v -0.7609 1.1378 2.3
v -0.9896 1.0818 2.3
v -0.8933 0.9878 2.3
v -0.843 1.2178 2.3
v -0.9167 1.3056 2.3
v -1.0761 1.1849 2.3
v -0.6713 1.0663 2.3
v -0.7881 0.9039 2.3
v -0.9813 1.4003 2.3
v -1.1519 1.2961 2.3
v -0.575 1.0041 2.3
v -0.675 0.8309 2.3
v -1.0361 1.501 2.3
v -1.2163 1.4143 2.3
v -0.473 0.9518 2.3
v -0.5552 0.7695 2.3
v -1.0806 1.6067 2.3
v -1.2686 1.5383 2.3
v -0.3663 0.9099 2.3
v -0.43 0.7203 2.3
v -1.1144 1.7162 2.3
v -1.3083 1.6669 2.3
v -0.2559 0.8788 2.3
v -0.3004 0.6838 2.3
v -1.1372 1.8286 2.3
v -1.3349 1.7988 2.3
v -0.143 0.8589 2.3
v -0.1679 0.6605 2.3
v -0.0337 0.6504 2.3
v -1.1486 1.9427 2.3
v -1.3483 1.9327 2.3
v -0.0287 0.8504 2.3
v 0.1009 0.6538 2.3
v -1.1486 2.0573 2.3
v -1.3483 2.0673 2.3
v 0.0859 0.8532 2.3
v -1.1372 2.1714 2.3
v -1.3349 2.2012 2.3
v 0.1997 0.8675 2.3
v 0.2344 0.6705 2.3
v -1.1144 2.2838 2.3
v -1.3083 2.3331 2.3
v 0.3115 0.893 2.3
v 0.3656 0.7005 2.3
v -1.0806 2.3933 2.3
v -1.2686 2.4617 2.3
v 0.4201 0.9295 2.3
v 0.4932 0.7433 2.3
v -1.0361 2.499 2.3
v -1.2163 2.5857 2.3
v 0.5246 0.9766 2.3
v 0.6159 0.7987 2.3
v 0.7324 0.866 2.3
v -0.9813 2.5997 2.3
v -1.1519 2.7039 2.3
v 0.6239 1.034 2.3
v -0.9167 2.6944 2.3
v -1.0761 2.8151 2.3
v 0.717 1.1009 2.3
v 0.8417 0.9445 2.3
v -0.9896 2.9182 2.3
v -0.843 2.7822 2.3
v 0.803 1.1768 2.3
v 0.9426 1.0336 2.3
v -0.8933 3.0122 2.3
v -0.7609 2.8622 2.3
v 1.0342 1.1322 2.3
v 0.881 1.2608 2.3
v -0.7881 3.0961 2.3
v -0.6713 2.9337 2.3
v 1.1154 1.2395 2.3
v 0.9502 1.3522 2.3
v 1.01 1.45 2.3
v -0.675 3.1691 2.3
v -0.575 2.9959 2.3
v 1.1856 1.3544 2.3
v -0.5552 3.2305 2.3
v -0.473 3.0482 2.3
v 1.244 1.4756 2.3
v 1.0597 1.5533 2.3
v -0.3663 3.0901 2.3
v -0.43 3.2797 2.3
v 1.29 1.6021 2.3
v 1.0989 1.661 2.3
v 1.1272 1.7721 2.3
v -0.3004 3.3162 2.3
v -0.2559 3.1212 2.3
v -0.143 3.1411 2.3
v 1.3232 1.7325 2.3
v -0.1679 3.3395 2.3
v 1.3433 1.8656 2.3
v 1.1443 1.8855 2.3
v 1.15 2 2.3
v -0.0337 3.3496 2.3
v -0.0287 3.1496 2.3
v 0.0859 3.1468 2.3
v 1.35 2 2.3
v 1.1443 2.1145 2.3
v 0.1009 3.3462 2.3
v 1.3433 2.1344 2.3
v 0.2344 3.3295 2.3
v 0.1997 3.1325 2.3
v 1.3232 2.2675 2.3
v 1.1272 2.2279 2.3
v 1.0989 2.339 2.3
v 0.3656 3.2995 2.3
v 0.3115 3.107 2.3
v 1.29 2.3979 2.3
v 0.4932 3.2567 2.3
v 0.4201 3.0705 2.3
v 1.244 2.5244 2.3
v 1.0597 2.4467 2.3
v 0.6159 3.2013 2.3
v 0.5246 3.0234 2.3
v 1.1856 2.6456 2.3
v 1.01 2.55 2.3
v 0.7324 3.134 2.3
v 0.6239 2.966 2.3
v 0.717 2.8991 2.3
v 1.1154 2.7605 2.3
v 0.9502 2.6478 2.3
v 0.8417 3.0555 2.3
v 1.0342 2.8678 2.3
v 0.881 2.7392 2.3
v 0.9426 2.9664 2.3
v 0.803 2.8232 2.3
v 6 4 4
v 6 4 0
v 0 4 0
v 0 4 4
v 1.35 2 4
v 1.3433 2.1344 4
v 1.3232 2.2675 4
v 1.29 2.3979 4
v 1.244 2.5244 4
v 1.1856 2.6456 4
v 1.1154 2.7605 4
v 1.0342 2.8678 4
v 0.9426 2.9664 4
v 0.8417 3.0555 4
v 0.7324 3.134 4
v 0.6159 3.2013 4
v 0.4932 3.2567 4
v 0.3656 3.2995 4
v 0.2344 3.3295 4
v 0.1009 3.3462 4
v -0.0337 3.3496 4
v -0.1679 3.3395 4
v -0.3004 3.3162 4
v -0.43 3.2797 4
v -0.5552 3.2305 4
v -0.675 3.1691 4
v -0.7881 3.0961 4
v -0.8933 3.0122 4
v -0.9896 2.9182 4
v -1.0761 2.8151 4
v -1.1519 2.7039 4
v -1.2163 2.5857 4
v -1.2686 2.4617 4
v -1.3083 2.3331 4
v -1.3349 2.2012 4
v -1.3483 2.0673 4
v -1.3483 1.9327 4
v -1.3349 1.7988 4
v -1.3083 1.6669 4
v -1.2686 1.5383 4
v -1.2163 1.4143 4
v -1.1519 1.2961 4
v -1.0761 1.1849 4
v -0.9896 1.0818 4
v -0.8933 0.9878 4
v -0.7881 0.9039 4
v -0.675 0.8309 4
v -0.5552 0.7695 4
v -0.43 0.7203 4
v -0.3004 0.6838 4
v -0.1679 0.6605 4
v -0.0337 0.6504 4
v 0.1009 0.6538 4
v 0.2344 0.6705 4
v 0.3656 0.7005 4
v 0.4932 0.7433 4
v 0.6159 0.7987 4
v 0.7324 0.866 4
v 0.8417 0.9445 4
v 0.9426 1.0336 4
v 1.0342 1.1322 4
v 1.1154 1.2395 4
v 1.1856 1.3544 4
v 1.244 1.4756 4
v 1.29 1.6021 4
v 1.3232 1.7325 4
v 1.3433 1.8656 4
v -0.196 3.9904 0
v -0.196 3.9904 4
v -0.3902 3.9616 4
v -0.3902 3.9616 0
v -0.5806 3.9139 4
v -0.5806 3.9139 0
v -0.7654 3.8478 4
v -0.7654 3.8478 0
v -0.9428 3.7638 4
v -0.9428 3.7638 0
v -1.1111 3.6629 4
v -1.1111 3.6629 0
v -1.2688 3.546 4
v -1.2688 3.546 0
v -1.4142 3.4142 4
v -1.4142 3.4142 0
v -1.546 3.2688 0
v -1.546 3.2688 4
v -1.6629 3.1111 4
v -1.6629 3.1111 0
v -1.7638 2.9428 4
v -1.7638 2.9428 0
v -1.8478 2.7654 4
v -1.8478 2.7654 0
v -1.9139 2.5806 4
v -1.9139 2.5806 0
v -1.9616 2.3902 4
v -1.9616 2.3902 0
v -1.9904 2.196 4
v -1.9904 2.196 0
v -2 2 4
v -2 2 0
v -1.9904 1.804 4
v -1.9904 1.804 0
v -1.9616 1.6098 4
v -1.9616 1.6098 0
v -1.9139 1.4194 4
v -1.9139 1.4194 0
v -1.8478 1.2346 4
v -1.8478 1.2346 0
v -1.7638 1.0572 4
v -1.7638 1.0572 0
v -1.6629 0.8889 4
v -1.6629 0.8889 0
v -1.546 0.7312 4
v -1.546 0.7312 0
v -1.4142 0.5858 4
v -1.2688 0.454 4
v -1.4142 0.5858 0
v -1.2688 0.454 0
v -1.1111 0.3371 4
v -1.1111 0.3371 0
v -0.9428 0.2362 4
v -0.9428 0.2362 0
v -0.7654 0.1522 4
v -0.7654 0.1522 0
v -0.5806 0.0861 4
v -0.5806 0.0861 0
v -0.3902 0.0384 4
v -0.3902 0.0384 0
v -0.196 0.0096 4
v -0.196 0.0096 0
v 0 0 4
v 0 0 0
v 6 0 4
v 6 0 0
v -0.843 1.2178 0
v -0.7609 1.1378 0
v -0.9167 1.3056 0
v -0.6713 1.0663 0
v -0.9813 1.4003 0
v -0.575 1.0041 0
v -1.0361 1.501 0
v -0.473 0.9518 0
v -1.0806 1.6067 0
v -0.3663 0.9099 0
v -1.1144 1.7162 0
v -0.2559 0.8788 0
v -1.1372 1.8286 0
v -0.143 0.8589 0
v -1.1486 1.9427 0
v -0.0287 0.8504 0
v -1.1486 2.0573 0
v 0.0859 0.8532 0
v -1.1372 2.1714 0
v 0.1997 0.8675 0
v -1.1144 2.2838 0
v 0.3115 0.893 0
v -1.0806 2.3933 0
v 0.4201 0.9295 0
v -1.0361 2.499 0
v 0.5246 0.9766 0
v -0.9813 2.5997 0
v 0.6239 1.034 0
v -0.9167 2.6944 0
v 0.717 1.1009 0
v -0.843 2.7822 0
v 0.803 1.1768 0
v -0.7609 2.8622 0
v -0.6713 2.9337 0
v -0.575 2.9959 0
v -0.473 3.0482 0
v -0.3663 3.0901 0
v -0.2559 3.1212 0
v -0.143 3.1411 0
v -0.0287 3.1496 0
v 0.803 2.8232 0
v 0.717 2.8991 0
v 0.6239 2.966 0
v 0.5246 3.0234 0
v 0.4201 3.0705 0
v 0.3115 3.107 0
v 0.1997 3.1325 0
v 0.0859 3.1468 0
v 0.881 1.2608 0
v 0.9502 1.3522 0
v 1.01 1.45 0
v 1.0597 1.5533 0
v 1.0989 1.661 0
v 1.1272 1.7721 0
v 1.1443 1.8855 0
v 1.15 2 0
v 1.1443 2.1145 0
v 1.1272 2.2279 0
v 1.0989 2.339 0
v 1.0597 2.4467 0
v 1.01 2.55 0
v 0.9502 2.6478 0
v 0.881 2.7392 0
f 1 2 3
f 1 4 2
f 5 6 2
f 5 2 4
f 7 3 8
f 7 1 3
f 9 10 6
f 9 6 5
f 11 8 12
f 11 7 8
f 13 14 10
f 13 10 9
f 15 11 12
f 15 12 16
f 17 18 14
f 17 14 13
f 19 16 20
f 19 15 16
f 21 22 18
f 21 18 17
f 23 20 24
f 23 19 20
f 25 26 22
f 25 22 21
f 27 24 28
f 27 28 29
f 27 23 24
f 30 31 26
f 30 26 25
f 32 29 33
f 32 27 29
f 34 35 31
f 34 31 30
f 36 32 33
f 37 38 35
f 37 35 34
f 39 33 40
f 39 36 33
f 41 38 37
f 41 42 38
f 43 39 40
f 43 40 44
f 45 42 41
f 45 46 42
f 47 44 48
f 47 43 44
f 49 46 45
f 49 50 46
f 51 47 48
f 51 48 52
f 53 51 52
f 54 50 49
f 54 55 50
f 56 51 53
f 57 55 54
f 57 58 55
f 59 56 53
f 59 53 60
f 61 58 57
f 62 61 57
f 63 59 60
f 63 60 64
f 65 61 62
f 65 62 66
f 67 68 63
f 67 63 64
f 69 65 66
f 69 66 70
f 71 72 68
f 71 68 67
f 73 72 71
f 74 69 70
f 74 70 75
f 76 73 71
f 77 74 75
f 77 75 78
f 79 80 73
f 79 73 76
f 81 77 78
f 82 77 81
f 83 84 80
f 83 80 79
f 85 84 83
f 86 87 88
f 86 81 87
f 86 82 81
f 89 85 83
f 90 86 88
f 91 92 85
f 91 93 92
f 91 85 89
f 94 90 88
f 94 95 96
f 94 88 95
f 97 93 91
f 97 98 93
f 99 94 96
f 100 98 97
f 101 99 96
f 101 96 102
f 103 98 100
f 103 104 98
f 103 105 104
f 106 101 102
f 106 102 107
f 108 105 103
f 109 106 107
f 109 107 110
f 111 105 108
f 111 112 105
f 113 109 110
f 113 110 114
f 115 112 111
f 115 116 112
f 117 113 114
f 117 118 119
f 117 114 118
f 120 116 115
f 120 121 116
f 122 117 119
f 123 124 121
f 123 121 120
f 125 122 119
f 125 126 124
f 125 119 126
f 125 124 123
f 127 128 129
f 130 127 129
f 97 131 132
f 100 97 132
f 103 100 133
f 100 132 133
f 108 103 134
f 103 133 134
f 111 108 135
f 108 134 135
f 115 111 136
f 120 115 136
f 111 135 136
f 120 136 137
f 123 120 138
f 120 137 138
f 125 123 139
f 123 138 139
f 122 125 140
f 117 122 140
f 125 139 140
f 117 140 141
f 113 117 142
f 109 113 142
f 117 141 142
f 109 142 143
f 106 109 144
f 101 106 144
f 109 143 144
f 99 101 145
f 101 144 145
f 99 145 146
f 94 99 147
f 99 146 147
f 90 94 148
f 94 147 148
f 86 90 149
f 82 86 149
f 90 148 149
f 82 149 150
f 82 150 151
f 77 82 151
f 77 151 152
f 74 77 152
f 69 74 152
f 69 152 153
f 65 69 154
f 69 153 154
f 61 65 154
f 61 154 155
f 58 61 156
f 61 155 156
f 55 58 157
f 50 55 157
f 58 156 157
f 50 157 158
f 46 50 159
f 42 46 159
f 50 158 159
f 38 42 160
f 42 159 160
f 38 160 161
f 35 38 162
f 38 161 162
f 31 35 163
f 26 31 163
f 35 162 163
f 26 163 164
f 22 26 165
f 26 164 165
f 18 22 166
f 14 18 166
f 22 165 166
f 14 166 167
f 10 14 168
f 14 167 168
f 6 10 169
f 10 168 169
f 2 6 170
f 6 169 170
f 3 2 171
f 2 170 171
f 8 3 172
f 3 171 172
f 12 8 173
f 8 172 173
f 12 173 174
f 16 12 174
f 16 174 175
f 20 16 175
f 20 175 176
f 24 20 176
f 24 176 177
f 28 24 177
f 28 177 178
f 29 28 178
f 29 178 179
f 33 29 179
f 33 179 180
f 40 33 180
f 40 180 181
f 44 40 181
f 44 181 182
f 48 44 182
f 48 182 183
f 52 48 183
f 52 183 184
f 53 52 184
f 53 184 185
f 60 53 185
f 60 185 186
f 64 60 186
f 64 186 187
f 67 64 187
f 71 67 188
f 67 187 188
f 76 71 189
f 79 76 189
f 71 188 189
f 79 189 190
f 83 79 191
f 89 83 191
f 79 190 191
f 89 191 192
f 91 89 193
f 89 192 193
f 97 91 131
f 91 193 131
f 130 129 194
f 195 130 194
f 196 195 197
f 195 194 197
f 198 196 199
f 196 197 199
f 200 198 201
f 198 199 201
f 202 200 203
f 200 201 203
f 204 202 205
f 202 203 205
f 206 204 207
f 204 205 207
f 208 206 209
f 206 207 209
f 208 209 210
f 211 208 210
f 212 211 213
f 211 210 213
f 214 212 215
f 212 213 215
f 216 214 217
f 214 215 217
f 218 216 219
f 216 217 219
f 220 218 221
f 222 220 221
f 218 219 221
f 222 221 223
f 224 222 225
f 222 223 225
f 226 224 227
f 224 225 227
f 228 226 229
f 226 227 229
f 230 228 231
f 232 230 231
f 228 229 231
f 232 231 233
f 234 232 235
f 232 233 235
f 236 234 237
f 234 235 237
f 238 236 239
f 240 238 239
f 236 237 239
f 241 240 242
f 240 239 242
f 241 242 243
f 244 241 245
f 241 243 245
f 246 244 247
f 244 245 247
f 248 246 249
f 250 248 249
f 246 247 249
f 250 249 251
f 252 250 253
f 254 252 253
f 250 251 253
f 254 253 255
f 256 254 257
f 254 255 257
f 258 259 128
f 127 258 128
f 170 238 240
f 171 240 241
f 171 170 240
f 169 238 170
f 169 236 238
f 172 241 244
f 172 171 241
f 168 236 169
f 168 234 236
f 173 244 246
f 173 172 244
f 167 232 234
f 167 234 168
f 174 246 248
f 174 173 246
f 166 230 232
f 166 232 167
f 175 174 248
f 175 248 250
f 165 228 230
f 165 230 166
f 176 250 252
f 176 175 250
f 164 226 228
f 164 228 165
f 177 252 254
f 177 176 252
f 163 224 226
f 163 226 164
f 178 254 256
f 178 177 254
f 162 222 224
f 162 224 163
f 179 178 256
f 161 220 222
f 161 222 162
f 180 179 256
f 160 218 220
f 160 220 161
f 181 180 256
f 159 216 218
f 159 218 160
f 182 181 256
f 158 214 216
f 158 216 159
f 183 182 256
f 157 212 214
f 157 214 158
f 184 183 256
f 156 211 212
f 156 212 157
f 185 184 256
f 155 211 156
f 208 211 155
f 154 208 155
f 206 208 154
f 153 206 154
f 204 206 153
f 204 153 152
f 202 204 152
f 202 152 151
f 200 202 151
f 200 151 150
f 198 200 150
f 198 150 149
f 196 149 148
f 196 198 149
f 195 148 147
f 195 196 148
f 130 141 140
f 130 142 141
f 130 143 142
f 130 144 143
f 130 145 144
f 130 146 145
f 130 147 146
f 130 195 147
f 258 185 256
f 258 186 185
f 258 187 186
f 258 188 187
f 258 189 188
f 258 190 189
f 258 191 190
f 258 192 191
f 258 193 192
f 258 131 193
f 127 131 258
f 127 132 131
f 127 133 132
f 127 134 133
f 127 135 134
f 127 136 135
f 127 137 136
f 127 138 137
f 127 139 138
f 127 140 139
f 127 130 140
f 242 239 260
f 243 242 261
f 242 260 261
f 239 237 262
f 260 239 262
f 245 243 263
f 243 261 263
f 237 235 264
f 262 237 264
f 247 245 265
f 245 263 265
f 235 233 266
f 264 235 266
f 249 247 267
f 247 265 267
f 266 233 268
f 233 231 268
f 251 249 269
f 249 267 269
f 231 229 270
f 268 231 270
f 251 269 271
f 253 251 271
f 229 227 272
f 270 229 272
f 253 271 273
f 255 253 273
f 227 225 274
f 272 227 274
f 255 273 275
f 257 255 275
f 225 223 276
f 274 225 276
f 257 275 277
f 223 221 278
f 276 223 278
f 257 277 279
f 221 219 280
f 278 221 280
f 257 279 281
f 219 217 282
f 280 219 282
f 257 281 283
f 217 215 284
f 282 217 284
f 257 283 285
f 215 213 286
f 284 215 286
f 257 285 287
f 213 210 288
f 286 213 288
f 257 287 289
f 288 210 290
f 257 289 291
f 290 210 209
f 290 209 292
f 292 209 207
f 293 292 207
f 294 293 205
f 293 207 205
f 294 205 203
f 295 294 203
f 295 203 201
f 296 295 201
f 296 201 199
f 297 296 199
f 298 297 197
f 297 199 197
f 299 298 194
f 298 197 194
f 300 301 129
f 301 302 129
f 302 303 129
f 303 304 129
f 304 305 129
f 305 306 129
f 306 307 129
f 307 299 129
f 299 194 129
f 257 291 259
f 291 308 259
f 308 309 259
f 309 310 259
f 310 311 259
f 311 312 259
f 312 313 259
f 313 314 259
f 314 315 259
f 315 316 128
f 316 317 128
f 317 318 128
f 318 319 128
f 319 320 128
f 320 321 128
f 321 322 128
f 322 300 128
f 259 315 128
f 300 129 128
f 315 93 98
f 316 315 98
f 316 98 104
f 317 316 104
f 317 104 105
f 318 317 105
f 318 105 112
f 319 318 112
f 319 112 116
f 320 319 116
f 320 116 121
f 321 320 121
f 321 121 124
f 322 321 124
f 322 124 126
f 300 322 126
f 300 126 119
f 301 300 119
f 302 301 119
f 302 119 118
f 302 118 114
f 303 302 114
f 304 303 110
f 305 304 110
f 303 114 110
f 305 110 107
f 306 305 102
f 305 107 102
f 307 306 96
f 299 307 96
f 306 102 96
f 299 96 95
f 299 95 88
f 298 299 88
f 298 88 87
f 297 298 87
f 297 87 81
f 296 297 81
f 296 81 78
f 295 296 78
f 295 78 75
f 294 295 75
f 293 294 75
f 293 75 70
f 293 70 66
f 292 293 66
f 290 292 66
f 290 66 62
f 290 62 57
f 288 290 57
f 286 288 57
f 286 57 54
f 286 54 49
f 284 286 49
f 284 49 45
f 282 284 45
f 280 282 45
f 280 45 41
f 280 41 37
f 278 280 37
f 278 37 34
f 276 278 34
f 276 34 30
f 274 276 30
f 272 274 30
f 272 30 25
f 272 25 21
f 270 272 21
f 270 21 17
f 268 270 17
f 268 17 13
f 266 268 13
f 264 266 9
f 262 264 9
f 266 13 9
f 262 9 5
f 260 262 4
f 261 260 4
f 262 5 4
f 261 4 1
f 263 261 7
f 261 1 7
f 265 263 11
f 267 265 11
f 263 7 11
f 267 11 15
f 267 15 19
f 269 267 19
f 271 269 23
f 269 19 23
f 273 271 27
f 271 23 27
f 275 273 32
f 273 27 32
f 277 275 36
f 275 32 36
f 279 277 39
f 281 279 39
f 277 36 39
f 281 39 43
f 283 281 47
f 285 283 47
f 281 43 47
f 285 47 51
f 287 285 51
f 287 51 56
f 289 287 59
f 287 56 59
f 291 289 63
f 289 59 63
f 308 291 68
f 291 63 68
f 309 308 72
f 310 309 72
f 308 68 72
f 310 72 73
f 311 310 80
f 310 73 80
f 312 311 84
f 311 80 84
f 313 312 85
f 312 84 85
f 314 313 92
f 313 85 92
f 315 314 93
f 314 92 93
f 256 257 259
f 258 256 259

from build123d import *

# Parameters (mm, degrees)
F1_DEPTH = 4
F2_R     = 1.35
F3_DEPTH = 1.7
F4_R     = 1.15
F5_DEPTH = 4


with BuildPart() as f1:
    # F0 (on Top) → F1 (new body)
    with BuildSketch(Plane.XY):
        with BuildLine():
            ThreePointArc((0, 4), (-2, 2), (0, 0))
            Line((0, 0), (0, 4))
        make_face()
        with BuildLine():
            Line((0, 4), (0, 0))
            ThreePointArc((0, 0), (1.414214, 0.585786), (2, 2))
            ThreePointArc((2, 2), (1.414214, 3.414214), (0, 4))
        make_face()
        with BuildLine():
            ThreePointArc((2, 2), (1.414214, 0.585786), (0, 0))
            Line((0, 0), (6, 0))
            Line((6, 0), (6, 4))
            Line((6, 4), (0, 4))
            ThreePointArc((0, 4), (1.414214, 3.414214), (2, 2))
        make_face()
    extrude(amount=F1_DEPTH)

    # F2 (on face) → F3 (cut)
    with BuildSketch(Plane.XY.offset(4)):
        with Locations((0, 2)):
            Circle(F2_R)
    extrude(amount=-F3_DEPTH, mode=Mode.SUBTRACT)

    # F4 (on face) → F5 (cut)
    with BuildSketch(Plane.XY.offset(2.3)):
        with Locations((0, 2)):
            Circle(F4_R)
    extrude(amount=-F5_DEPTH, mode=Mode.SUBTRACT)


solid = f1.part
